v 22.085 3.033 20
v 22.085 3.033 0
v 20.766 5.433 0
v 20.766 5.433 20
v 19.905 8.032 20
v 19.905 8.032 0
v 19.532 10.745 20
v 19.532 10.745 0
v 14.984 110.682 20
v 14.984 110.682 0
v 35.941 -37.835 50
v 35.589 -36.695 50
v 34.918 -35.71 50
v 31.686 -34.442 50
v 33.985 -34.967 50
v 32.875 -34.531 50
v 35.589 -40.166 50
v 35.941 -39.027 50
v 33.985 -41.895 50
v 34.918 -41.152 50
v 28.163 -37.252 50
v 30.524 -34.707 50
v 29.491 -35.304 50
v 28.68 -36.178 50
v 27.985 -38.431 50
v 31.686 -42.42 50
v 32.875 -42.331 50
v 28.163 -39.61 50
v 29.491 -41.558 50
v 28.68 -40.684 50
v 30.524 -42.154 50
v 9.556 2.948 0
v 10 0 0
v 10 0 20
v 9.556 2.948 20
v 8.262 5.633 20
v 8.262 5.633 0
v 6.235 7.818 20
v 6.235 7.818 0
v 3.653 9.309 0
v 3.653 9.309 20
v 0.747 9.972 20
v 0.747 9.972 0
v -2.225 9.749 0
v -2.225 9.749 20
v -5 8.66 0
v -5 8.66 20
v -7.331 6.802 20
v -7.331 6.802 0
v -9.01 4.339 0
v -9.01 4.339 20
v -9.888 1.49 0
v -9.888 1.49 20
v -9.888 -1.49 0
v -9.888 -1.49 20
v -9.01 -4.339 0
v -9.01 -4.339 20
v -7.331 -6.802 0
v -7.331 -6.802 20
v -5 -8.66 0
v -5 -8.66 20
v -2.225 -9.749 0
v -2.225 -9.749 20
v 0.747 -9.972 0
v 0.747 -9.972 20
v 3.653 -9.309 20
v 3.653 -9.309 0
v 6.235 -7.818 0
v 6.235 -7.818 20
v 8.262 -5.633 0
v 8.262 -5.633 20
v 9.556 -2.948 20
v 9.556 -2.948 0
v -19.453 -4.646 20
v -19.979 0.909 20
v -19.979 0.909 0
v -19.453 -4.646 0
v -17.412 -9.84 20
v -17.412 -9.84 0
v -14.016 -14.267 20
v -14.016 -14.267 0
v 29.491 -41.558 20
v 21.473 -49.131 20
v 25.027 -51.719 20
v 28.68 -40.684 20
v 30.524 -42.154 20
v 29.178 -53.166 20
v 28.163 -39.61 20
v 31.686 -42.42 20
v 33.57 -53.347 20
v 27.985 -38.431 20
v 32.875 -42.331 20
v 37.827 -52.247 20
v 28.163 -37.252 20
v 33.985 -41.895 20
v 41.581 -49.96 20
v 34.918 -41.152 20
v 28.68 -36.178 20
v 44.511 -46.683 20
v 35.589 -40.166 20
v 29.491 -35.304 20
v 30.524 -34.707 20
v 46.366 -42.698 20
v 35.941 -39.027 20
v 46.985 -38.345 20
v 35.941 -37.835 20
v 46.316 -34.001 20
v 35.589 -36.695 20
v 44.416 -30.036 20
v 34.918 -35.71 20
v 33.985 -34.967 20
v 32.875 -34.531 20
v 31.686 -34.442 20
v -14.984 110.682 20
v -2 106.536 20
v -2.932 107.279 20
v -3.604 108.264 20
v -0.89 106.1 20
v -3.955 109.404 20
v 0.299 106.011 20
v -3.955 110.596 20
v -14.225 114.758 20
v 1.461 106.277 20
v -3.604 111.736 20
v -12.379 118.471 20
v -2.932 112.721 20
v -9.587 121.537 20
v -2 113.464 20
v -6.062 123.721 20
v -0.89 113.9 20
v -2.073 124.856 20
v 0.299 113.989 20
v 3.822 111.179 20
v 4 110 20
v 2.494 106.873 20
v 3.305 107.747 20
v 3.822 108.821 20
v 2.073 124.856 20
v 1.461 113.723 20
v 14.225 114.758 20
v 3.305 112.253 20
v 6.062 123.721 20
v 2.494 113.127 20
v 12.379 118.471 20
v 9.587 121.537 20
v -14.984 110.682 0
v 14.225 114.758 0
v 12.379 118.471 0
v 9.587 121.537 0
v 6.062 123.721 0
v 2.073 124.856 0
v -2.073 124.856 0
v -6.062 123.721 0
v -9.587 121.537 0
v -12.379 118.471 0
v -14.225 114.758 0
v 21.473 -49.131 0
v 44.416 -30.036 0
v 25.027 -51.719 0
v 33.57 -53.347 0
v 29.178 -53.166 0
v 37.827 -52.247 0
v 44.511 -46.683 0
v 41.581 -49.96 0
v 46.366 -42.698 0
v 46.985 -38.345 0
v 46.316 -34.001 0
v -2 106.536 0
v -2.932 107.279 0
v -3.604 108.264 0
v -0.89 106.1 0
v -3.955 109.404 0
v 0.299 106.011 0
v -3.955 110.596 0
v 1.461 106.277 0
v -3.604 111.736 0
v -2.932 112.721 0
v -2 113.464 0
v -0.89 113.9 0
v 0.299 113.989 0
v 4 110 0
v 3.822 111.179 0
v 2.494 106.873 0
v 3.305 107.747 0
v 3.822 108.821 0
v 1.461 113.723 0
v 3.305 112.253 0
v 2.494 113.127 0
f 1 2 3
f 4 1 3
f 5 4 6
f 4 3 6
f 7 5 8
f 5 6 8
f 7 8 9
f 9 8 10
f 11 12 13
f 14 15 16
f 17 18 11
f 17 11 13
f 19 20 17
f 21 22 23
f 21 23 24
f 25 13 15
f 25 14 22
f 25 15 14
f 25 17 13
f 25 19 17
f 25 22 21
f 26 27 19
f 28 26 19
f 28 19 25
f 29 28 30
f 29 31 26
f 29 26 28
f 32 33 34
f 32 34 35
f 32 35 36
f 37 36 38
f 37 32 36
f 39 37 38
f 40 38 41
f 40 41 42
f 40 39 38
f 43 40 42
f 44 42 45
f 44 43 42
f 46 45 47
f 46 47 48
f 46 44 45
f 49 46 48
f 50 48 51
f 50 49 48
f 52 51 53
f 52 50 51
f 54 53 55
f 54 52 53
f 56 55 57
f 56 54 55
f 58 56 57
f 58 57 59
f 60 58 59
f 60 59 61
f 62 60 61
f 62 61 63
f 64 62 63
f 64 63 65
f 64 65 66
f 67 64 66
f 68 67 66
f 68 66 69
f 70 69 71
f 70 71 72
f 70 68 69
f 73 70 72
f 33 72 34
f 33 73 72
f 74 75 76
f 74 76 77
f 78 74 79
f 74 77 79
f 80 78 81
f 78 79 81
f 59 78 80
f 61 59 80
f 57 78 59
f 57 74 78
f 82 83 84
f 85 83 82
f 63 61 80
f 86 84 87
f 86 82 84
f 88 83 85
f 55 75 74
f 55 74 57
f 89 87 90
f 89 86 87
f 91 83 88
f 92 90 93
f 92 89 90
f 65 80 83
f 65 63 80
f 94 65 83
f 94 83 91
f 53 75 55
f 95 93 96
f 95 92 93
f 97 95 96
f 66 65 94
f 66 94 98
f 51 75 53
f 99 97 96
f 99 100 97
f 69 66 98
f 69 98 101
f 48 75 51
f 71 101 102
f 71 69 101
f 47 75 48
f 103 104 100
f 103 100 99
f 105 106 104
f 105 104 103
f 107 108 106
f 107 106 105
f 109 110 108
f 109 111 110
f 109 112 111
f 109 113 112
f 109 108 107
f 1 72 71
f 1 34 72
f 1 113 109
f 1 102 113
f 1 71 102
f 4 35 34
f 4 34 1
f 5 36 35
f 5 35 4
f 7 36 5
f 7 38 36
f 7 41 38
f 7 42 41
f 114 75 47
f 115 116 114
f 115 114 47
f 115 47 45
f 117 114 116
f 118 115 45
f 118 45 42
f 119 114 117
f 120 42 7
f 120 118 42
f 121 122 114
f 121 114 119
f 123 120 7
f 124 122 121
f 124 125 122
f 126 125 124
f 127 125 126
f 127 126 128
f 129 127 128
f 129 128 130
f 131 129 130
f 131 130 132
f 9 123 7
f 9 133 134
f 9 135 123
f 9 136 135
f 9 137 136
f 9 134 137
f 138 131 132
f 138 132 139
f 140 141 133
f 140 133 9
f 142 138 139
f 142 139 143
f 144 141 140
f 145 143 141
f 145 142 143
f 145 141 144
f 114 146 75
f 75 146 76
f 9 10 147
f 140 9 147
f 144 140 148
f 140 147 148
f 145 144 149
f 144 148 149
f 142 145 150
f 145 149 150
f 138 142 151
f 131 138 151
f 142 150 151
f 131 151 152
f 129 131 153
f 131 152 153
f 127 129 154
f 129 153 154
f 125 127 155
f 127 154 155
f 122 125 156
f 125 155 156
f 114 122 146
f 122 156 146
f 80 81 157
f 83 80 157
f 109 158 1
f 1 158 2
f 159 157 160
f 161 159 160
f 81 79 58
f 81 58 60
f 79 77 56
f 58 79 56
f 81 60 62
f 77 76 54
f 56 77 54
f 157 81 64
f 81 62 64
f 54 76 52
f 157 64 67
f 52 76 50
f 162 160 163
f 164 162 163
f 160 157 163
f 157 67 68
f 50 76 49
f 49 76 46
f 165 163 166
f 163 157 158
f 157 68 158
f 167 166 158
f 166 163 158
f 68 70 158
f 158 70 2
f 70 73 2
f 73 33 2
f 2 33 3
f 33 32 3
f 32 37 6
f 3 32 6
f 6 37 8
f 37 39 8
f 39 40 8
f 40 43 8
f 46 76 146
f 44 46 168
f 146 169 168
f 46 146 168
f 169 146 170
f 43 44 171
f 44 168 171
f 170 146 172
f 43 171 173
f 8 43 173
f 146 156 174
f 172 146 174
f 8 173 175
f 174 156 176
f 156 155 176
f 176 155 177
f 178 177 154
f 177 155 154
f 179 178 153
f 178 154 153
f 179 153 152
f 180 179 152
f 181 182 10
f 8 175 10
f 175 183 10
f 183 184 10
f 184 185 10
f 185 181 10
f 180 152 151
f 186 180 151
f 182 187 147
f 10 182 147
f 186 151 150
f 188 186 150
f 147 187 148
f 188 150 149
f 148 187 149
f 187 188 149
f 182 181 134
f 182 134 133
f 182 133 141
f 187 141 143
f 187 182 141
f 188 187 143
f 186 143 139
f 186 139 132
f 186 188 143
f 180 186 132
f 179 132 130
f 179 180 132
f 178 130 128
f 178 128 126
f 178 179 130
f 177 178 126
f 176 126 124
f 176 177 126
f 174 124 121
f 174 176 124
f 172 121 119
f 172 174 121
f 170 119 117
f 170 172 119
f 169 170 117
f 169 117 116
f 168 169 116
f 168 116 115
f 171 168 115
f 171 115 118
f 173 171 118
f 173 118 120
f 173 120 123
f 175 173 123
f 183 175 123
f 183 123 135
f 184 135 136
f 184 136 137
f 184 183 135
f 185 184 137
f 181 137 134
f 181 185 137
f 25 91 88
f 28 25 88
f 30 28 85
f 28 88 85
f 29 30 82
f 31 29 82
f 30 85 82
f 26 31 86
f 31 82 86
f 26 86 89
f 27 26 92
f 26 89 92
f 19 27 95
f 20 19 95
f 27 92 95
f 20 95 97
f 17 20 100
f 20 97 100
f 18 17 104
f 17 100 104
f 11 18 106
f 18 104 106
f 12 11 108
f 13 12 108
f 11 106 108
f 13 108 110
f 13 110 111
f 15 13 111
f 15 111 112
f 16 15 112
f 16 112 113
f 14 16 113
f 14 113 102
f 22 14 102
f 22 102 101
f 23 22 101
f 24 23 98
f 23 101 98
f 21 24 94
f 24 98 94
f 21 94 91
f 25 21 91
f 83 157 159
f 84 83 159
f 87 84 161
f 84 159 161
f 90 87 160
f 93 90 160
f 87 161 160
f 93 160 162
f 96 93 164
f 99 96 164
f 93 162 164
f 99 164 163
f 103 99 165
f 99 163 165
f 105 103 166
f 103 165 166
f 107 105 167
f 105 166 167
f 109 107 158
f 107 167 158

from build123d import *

# Parameters (mm, degrees)
SKETCH_1_R      = 10
SKETCH_1_R_2    = 4
EXTRUDE_1_DEPTH = 20
SKETCH_3_R      = 4
EXTRUDE_2_DEPTH = 30


with BuildPart() as part:
    # 草图1 → 凸台-拉伸1 (new body)
    with BuildSketch(Plane.XY):
        with BuildLine():
            Line((-14.98449612, 110.681818182), (-19.97932816, 0.909090909))
            ThreePointArc((-19.97932816, 0.909090909), (-18.614490773, -7.314419545), (-14.01590192, -14.267252481))
            Line((-14.01590192, -14.267252481), (21.473440532, -49.131368307))
            ThreePointArc((21.473440532, -49.131368307), (41.580977064, -49.96020763), (44.416415431, -30.036345322))
            Line((44.416415431, -30.036345322), (22.085208252, 3.03263475))
            ThreePointArc((22.085208252, 3.03263475), (20.276358226, 6.712847666), (19.53176059, 10.745400192))
            Line((19.53176059, 10.745400192), (14.98449612, 110.681818182))
            ThreePointArc((14.98449612, 110.681818182), (0, 125), (-14.98449612, 110.681818182))
        make_face()
        Circle(SKETCH_1_R, mode=Mode.SUBTRACT)
        with Locations((0, 110)):
            Circle(SKETCH_1_R_2, mode=Mode.SUBTRACT)
    extrude(amount=EXTRUDE_1_DEPTH)

    # 草图3 → 凸台-拉伸2 (add)
    with BuildSketch(Plane.XY.offset(20)):
        with Locations(Location((31.985366972, -38.430928946, 0), (0, 0, 180))):
            Circle(SKETCH_3_R)
    extrude(amount=EXTRUDE_2_DEPTH)


solid = part.part
